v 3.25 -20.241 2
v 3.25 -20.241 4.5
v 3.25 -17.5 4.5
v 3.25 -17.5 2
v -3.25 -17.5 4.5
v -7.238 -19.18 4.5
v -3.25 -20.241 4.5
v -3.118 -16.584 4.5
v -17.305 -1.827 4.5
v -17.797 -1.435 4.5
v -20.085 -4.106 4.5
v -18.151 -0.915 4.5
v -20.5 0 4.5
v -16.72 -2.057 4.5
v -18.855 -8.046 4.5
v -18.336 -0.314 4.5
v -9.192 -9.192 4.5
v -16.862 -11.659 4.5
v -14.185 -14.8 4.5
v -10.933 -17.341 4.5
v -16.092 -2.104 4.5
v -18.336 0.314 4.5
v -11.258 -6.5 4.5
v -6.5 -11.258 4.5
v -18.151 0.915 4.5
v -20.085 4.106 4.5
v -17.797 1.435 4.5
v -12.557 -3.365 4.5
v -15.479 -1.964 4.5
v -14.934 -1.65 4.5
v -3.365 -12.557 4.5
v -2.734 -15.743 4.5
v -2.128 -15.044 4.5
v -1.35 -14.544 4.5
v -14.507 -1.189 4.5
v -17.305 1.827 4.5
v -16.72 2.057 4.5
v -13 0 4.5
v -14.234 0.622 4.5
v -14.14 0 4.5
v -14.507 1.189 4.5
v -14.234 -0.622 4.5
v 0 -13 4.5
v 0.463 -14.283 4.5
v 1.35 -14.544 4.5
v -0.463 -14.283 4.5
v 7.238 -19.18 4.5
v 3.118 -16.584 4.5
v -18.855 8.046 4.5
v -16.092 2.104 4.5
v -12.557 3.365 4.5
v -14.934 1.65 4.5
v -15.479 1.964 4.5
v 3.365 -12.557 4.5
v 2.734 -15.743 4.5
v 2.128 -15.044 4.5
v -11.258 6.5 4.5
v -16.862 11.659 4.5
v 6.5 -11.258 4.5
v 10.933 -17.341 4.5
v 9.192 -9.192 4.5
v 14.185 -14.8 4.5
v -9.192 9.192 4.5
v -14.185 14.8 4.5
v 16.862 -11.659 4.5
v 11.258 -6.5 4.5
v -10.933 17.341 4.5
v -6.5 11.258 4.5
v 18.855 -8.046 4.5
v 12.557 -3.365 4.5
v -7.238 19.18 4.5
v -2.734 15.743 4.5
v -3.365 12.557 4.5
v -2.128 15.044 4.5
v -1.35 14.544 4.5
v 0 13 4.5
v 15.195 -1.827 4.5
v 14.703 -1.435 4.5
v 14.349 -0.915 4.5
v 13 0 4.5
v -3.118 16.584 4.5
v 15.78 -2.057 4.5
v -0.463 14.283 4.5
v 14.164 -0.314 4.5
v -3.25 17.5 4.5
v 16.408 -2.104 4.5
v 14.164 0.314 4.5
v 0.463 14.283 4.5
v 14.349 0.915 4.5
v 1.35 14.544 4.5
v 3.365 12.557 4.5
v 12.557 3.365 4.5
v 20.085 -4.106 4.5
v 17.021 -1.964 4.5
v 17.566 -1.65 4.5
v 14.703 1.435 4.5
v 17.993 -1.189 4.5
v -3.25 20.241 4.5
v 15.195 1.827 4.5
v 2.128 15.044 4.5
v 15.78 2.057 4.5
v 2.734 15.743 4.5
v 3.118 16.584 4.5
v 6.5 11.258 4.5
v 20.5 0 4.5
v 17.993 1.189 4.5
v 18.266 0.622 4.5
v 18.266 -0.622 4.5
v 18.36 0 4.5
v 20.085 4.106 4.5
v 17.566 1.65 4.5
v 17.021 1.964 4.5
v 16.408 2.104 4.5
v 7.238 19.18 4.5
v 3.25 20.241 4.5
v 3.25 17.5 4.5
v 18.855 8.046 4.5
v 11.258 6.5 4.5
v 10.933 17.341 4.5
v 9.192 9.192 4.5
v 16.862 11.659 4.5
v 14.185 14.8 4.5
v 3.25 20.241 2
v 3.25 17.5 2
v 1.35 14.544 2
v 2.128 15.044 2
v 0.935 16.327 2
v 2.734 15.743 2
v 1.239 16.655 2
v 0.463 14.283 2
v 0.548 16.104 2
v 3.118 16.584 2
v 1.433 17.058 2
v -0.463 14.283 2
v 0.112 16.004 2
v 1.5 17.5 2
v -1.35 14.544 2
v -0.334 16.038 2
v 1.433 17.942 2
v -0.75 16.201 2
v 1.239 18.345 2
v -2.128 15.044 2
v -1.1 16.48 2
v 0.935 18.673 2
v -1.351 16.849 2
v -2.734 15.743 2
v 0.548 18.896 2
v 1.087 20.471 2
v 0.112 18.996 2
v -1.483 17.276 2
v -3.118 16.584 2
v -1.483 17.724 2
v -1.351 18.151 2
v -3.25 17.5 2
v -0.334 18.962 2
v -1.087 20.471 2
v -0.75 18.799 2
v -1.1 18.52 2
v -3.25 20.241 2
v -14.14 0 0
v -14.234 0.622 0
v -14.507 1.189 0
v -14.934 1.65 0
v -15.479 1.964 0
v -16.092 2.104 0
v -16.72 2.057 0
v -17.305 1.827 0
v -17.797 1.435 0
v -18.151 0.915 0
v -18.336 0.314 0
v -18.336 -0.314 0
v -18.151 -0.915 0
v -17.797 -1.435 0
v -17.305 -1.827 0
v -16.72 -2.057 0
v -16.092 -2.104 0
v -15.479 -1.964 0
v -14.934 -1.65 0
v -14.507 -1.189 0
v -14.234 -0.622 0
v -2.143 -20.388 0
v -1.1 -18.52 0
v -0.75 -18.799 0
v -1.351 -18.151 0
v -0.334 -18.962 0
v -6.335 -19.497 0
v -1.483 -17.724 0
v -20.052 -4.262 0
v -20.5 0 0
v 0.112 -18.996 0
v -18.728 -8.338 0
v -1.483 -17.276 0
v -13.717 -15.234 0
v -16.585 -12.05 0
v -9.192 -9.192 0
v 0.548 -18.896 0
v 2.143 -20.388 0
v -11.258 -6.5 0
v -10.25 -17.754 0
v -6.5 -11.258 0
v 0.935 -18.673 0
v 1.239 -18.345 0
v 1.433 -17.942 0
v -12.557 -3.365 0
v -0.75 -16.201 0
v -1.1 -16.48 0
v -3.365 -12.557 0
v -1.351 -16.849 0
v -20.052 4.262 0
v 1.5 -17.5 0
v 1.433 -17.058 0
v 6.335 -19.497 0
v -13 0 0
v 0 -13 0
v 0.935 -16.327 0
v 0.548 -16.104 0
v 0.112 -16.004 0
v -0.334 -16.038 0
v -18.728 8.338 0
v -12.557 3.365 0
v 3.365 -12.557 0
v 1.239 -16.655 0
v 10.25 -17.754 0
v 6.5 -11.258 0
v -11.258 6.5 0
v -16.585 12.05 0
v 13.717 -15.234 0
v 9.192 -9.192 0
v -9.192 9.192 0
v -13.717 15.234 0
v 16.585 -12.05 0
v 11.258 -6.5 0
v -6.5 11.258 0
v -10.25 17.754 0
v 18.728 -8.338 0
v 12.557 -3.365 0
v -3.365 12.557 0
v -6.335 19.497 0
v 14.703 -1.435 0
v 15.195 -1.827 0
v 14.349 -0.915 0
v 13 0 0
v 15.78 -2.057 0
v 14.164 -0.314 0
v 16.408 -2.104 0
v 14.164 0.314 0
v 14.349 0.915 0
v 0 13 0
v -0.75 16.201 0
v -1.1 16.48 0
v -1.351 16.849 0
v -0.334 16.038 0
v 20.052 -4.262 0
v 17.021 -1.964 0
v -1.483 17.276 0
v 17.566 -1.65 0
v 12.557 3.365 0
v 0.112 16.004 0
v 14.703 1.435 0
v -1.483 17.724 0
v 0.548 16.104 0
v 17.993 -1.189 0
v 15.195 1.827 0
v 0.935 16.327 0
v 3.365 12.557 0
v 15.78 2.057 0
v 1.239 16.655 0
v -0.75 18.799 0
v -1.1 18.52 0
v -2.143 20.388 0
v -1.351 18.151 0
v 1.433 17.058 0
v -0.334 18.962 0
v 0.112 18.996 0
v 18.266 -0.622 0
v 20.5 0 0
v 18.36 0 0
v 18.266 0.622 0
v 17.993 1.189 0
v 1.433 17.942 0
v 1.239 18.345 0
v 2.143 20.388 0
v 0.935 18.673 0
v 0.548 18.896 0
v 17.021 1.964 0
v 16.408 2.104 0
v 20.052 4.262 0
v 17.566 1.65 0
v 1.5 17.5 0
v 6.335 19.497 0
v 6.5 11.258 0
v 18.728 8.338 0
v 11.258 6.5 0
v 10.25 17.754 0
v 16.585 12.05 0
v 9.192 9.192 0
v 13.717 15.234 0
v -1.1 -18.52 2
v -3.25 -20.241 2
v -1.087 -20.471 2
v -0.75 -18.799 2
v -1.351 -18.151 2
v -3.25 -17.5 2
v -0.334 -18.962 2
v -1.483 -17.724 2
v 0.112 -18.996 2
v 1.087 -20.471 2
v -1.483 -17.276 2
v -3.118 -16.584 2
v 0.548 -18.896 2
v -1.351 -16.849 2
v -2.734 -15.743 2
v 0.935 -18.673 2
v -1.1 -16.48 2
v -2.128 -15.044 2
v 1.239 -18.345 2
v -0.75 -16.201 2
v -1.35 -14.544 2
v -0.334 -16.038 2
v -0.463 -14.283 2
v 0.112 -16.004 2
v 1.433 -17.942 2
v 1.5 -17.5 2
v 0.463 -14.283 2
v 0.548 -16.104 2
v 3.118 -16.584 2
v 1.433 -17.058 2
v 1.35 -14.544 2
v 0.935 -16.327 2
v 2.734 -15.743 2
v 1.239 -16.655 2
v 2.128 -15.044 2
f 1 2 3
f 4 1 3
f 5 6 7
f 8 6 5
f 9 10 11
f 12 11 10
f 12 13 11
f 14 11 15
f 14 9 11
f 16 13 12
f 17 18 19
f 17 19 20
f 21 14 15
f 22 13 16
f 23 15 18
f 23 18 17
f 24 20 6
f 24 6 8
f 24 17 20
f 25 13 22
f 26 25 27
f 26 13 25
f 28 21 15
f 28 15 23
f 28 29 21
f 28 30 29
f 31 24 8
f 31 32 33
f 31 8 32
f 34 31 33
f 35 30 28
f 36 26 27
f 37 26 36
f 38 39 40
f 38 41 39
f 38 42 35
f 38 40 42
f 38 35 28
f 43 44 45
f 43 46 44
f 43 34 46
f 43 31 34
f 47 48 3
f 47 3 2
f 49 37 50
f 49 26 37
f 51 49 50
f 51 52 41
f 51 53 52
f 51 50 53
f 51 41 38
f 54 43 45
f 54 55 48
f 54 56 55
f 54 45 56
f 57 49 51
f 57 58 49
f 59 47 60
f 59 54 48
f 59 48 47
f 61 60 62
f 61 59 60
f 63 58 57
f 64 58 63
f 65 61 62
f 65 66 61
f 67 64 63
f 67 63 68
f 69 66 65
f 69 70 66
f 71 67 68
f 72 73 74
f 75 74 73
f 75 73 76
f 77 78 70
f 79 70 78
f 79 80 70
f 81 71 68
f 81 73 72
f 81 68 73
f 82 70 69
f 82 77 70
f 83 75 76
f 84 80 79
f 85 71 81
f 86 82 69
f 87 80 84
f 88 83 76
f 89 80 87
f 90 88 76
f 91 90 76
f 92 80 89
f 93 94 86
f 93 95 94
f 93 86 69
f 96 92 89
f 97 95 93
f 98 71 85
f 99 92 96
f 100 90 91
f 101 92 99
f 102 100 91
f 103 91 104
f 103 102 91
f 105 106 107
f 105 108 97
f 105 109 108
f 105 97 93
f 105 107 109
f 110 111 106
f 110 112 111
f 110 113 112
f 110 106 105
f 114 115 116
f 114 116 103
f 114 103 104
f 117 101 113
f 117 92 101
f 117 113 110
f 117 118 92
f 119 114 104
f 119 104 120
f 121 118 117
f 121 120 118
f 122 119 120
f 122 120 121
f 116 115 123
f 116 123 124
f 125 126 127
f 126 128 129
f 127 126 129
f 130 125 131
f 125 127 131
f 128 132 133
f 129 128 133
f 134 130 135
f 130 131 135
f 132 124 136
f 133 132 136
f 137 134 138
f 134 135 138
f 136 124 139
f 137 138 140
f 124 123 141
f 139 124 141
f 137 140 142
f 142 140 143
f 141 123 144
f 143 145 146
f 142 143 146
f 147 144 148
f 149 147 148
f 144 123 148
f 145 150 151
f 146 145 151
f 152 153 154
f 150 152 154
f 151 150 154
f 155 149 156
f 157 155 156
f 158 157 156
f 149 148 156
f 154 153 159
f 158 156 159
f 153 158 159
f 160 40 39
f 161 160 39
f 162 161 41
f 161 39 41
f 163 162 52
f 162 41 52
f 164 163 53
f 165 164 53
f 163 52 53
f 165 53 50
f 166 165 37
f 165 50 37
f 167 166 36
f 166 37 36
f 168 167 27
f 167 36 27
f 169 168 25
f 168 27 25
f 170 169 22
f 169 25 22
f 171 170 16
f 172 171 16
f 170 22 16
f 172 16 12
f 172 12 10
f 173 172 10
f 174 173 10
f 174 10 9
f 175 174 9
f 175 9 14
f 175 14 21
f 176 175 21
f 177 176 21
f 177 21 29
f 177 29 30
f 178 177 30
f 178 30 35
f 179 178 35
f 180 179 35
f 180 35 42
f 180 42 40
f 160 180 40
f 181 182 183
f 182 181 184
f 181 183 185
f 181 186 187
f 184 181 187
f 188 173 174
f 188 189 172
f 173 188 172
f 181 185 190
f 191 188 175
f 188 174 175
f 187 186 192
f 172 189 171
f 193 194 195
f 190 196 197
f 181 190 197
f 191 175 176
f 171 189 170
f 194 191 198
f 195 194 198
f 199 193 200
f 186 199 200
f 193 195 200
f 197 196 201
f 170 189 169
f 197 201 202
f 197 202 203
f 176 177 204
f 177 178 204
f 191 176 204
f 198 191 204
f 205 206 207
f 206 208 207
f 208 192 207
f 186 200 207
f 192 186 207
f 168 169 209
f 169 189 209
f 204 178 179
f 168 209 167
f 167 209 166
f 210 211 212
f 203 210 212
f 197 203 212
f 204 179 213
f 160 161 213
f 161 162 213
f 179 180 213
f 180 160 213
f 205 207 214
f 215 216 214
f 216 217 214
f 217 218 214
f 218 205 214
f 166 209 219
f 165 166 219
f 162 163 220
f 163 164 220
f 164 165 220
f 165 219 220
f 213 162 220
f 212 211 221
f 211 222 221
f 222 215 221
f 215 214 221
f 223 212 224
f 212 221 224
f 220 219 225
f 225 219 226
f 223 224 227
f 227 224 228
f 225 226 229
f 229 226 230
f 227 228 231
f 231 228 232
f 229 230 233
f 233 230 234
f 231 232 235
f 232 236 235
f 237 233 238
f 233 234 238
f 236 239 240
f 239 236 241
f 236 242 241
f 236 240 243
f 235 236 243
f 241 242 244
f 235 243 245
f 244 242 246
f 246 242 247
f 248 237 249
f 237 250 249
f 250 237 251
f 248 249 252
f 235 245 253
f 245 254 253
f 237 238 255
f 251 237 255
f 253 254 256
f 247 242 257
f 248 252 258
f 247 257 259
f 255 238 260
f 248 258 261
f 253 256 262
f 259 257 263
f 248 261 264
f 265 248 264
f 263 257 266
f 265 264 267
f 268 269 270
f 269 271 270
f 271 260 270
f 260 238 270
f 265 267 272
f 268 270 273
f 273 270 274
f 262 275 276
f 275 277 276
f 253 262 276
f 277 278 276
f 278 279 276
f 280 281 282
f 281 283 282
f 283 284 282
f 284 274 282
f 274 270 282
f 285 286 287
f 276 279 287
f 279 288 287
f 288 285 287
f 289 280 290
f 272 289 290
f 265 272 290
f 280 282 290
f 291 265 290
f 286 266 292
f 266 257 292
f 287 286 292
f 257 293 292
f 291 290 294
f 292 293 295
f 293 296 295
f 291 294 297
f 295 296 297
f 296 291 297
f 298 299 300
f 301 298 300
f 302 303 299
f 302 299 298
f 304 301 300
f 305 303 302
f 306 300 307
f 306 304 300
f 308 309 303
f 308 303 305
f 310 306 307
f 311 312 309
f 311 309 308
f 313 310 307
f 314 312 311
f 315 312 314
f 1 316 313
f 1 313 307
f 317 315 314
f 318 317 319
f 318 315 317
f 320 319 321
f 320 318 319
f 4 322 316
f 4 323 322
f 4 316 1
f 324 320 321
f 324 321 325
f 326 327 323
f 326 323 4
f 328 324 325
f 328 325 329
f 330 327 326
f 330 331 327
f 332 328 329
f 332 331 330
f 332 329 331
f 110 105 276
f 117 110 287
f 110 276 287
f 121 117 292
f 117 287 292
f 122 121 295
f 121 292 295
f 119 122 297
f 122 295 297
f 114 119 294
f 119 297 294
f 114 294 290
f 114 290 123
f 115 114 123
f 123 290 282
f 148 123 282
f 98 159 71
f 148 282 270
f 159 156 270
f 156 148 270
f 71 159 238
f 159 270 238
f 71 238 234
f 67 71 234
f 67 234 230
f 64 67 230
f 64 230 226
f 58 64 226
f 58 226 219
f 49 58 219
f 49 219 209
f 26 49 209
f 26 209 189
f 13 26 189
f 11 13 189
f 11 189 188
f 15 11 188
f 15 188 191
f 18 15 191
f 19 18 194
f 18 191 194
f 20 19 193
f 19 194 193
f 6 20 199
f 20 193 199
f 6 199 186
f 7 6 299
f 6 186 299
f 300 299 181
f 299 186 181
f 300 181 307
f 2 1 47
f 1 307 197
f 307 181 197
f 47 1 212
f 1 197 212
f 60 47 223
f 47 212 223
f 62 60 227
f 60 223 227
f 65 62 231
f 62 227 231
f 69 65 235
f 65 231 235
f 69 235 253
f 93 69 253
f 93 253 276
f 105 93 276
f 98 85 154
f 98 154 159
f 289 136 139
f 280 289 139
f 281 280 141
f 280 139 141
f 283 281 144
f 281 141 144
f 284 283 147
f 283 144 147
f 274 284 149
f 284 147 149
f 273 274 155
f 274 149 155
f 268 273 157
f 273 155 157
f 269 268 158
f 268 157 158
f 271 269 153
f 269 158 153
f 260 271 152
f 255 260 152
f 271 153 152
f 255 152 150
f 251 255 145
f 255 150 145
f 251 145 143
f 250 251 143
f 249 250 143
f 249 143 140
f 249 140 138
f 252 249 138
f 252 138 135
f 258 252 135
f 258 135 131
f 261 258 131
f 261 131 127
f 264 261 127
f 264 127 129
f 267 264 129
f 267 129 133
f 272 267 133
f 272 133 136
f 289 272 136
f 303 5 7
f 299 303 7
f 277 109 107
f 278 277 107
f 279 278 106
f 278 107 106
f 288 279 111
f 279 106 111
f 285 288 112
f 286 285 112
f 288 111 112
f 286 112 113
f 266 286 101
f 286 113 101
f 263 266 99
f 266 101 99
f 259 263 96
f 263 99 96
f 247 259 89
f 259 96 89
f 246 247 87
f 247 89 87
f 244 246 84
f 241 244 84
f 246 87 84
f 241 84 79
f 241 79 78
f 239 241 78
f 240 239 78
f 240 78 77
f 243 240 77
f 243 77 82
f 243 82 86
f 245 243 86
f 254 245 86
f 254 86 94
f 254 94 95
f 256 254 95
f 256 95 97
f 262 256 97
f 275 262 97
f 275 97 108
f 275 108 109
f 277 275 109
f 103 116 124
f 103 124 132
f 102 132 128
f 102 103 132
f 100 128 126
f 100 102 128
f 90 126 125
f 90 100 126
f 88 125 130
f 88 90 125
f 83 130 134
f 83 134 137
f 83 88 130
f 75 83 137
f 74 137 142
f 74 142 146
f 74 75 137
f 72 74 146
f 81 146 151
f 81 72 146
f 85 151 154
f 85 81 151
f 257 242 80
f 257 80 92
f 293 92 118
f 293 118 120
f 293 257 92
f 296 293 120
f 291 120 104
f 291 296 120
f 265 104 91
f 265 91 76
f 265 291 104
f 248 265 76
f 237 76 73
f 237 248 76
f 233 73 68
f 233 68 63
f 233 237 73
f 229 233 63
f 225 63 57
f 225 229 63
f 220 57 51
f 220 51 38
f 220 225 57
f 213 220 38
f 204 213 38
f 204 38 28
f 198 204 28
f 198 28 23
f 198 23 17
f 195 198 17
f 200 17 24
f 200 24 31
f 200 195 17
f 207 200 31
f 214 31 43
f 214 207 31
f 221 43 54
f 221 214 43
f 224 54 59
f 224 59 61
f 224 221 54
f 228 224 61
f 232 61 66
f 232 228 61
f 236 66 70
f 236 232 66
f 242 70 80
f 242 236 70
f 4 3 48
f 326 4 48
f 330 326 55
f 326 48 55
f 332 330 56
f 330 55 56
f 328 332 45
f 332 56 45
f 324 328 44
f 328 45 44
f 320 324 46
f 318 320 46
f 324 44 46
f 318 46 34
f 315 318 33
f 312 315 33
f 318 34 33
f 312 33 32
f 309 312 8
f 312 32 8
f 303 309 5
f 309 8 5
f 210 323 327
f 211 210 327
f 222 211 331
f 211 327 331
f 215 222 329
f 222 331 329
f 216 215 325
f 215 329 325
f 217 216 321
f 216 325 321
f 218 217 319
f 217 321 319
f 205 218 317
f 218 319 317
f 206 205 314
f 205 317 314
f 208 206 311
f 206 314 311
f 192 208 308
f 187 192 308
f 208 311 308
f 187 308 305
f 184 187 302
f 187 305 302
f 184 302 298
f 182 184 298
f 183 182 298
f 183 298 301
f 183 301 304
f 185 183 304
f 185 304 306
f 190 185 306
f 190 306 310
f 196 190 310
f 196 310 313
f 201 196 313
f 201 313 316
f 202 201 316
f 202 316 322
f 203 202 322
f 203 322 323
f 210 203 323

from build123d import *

# Parameters (mm, degrees)
ESQUISSE1_R             = 20.5
ESQUISSE1_R_2           = 13
BOSS_EXTRU_1_DEPTH      = 4.5
ENL_V_MAT_EXTRU_1_REACH = 6.5
ESQUISSE2_R             = 1.5
ESQUISSE2_R_2           = 2.11
ENL_V_MAT_EXTRU_2_DEPTH = 2.5


with BuildPart() as part:
    # Esquisse1 → Boss.-Extru.1 (new body)
    with BuildSketch(Plane.XY):
        Circle(ESQUISSE1_R)
        Circle(ESQUISSE1_R_2, mode=Mode.SUBTRACT)
    extrude(amount=BOSS_EXTRU_1_DEPTH)

    # Esquisse2 → Enlèv. mat.-Extru.1 (cut, up to next)
    with BuildSketch(Plane.XY.offset(4.5), mode=Mode.PRIVATE) as enl_v_mat_extru_1_sk1:
        with Locations((0, 17.5)):
            Circle(ESQUISSE2_R)
    enl_v_mat_extru_1_tool1 = extrude(enl_v_mat_extru_1_sk1.sketch, amount=-ENL_V_MAT_EXTRU_1_REACH, mode=Mode.PRIVATE) & part.part
    add(enl_v_mat_extru_1_tool1.solids().sort_by_distance((0, 17.5, 4.5))[0], mode=Mode.SUBTRACT)
    # Esquisse2 → Enlèv. mat.-Extru.1 (cut, up to next)
    with BuildSketch(Plane.XY.offset(4.5), mode=Mode.PRIVATE) as enl_v_mat_extru_1_sk2:
        with Locations((16.25, 0)):
            Circle(ESQUISSE2_R_2)
    enl_v_mat_extru_1_tool2 = extrude(enl_v_mat_extru_1_sk2.sketch, amount=-ENL_V_MAT_EXTRU_1_REACH, mode=Mode.PRIVATE) & part.part
    add(enl_v_mat_extru_1_tool2.solids().sort_by_distance((16.25, 0, 4.5))[0], mode=Mode.SUBTRACT)
    # Esquisse2 → Enlèv. mat.-Extru.1 (cut, up to next)
    with BuildSketch(Plane.XY.offset(4.5), mode=Mode.PRIVATE) as enl_v_mat_extru_1_sk3:
        with Locations((0, -17.5)):
            Circle(ESQUISSE2_R)
    enl_v_mat_extru_1_tool3 = extrude(enl_v_mat_extru_1_sk3.sketch, amount=-ENL_V_MAT_EXTRU_1_REACH, mode=Mode.PRIVATE) & part.part
    add(enl_v_mat_extru_1_tool3.solids().sort_by_distance((0, -17.5, 4.5))[0], mode=Mode.SUBTRACT)
    # Esquisse2 → Enlèv. mat.-Extru.1 (cut, up to next)
    with BuildSketch(Plane.XY.offset(4.5), mode=Mode.PRIVATE) as enl_v_mat_extru_1_sk4:
        with Locations((-16.25, 0)):
            Circle(ESQUISSE2_R_2)
    enl_v_mat_extru_1_tool4 = extrude(enl_v_mat_extru_1_sk4.sketch, amount=-ENL_V_MAT_EXTRU_1_REACH, mode=Mode.PRIVATE) & part.part
    add(enl_v_mat_extru_1_tool4.solids().sort_by_distance((-16.25, 0, 4.5))[0], mode=Mode.SUBTRACT)

    # Esquisse3 → Enlèv. mat.-Extru.2 (cut)
    with BuildSketch(Plane.XY.offset(4.5)):
        with BuildLine():
            Line((-3.25, 17.5), (-3.25, 27.5))
            Line((-3.25, 27.5), (3.25, 27.5))
            Line((3.25, 27.5), (3.25, 17.5))
            ThreePointArc((3.25, 17.5), (0, 14.25), (-3.25, 17.5))
        make_face()
        with BuildLine():
            Line((-3.25, -27.5), (3.25, -27.5))
            Line((3.25, -27.5), (3.25, -17.5))
            ThreePointArc((3.25, -17.5), (0, -14.25), (-3.25, -17.5))
            Line((-3.25, -17.5), (-3.25, -27.5))
        make_face()
    extrude(amount=-ENL_V_MAT_EXTRU_2_DEPTH, mode=Mode.SUBTRACT)


solid = part.part
